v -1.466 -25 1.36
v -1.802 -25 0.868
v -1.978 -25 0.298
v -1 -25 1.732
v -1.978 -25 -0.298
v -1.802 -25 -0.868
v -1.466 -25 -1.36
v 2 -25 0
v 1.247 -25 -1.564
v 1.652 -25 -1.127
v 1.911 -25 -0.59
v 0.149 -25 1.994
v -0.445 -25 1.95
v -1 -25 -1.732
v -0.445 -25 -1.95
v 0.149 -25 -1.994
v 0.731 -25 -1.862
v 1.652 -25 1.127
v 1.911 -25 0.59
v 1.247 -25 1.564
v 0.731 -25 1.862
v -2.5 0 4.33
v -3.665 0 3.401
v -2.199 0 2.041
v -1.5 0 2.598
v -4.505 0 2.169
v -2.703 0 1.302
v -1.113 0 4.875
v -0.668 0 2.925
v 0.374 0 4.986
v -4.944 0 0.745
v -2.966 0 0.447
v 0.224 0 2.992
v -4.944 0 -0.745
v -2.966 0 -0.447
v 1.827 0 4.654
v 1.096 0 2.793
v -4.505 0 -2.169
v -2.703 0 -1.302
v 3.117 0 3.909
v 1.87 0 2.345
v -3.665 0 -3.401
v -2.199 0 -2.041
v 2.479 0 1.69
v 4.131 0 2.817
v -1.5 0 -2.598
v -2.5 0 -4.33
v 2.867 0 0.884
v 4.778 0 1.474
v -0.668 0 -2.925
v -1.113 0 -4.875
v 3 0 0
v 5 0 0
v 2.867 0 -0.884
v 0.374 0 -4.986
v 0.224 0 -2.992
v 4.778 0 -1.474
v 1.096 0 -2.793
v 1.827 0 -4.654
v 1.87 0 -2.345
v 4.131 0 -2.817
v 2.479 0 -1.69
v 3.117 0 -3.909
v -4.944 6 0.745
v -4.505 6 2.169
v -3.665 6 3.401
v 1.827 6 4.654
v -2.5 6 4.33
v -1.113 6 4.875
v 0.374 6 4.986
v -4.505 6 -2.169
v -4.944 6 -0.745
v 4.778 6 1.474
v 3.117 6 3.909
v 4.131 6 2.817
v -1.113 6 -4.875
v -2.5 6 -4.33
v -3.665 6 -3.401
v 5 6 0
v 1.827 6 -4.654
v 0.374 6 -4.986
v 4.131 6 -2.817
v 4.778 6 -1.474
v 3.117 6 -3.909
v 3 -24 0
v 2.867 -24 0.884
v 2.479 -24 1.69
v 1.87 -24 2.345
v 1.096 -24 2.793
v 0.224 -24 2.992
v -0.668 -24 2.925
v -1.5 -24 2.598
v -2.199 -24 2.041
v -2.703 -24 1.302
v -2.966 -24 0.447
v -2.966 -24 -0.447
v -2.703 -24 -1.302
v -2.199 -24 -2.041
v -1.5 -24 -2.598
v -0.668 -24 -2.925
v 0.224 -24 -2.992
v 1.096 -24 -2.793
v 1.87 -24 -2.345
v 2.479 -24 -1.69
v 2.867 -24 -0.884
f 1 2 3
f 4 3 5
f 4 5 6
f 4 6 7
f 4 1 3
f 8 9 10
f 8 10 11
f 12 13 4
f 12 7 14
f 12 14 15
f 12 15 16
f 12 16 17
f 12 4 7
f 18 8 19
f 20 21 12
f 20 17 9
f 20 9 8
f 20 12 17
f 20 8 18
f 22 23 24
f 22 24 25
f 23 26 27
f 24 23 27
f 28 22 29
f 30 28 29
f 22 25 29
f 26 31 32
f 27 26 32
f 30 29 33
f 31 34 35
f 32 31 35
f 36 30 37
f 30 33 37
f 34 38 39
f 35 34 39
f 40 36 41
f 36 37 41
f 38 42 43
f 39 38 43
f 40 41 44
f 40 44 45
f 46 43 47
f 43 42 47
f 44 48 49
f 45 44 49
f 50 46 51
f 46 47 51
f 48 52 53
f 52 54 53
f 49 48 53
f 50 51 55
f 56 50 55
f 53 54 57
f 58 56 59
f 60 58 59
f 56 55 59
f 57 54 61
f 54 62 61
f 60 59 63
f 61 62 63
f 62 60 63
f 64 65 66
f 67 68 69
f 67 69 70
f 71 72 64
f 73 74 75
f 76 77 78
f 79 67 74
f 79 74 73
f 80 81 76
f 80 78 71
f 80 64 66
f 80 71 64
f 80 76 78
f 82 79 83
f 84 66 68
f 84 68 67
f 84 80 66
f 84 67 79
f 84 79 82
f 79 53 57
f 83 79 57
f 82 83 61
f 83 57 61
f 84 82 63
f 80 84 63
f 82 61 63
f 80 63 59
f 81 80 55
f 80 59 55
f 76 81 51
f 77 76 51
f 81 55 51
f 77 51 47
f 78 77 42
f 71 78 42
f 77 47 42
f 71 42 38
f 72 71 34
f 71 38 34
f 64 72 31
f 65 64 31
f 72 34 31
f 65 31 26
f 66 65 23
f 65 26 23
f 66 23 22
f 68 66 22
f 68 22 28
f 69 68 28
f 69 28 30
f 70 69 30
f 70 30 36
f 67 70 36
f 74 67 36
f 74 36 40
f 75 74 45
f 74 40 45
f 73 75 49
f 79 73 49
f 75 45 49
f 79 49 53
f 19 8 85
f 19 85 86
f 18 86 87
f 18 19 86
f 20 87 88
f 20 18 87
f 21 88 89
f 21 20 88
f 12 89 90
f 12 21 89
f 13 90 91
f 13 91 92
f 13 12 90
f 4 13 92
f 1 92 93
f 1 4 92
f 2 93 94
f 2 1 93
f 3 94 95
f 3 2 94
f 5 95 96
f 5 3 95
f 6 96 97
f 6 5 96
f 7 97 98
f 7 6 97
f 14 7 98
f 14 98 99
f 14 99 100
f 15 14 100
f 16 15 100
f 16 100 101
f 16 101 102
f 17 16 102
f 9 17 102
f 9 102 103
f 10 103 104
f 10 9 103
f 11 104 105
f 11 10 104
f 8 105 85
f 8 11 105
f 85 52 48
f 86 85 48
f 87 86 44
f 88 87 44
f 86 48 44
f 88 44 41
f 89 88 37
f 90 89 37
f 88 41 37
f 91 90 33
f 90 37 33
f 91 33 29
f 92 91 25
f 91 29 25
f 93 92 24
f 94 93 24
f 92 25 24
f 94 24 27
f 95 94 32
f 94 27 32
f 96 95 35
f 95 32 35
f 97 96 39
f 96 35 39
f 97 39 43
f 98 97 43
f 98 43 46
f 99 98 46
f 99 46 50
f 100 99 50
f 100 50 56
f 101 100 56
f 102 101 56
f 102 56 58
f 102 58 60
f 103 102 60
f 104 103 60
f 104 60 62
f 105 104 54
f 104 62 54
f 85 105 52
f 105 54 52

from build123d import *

# Parameters (mm, degrees)
SKETCH1_R           = 5
BOSS_EXTRUDE1_DEPTH = 6
SKETCH2_R           = 3
BOSS_EXTRUDE2_DEPTH = 25
CHAMFER1_SIZE       = 1


with BuildPart() as part:
    # Sketch1 → Boss-Extrude1 (new body)
    with BuildSketch(Plane(origin=(0, 0, 0), x_dir=(1, 0, 0), z_dir=(0, 1, 0))):
        Circle(SKETCH1_R)
    extrude(amount=BOSS_EXTRUDE1_DEPTH)

    # Sketch2 → Boss-Extrude2 (add)
    with BuildSketch(Plane.XZ):
        Circle(SKETCH2_R)
    extrude(amount=BOSS_EXTRUDE2_DEPTH)

    # Chamfer1
    chamfer1_edges = [part.edges().sort_by_distance(p)[0] for p in [
        (-3, -25, 0),
    ]]
    chamfer(chamfer1_edges, length=CHAMFER1_SIZE)


solid = part.part
